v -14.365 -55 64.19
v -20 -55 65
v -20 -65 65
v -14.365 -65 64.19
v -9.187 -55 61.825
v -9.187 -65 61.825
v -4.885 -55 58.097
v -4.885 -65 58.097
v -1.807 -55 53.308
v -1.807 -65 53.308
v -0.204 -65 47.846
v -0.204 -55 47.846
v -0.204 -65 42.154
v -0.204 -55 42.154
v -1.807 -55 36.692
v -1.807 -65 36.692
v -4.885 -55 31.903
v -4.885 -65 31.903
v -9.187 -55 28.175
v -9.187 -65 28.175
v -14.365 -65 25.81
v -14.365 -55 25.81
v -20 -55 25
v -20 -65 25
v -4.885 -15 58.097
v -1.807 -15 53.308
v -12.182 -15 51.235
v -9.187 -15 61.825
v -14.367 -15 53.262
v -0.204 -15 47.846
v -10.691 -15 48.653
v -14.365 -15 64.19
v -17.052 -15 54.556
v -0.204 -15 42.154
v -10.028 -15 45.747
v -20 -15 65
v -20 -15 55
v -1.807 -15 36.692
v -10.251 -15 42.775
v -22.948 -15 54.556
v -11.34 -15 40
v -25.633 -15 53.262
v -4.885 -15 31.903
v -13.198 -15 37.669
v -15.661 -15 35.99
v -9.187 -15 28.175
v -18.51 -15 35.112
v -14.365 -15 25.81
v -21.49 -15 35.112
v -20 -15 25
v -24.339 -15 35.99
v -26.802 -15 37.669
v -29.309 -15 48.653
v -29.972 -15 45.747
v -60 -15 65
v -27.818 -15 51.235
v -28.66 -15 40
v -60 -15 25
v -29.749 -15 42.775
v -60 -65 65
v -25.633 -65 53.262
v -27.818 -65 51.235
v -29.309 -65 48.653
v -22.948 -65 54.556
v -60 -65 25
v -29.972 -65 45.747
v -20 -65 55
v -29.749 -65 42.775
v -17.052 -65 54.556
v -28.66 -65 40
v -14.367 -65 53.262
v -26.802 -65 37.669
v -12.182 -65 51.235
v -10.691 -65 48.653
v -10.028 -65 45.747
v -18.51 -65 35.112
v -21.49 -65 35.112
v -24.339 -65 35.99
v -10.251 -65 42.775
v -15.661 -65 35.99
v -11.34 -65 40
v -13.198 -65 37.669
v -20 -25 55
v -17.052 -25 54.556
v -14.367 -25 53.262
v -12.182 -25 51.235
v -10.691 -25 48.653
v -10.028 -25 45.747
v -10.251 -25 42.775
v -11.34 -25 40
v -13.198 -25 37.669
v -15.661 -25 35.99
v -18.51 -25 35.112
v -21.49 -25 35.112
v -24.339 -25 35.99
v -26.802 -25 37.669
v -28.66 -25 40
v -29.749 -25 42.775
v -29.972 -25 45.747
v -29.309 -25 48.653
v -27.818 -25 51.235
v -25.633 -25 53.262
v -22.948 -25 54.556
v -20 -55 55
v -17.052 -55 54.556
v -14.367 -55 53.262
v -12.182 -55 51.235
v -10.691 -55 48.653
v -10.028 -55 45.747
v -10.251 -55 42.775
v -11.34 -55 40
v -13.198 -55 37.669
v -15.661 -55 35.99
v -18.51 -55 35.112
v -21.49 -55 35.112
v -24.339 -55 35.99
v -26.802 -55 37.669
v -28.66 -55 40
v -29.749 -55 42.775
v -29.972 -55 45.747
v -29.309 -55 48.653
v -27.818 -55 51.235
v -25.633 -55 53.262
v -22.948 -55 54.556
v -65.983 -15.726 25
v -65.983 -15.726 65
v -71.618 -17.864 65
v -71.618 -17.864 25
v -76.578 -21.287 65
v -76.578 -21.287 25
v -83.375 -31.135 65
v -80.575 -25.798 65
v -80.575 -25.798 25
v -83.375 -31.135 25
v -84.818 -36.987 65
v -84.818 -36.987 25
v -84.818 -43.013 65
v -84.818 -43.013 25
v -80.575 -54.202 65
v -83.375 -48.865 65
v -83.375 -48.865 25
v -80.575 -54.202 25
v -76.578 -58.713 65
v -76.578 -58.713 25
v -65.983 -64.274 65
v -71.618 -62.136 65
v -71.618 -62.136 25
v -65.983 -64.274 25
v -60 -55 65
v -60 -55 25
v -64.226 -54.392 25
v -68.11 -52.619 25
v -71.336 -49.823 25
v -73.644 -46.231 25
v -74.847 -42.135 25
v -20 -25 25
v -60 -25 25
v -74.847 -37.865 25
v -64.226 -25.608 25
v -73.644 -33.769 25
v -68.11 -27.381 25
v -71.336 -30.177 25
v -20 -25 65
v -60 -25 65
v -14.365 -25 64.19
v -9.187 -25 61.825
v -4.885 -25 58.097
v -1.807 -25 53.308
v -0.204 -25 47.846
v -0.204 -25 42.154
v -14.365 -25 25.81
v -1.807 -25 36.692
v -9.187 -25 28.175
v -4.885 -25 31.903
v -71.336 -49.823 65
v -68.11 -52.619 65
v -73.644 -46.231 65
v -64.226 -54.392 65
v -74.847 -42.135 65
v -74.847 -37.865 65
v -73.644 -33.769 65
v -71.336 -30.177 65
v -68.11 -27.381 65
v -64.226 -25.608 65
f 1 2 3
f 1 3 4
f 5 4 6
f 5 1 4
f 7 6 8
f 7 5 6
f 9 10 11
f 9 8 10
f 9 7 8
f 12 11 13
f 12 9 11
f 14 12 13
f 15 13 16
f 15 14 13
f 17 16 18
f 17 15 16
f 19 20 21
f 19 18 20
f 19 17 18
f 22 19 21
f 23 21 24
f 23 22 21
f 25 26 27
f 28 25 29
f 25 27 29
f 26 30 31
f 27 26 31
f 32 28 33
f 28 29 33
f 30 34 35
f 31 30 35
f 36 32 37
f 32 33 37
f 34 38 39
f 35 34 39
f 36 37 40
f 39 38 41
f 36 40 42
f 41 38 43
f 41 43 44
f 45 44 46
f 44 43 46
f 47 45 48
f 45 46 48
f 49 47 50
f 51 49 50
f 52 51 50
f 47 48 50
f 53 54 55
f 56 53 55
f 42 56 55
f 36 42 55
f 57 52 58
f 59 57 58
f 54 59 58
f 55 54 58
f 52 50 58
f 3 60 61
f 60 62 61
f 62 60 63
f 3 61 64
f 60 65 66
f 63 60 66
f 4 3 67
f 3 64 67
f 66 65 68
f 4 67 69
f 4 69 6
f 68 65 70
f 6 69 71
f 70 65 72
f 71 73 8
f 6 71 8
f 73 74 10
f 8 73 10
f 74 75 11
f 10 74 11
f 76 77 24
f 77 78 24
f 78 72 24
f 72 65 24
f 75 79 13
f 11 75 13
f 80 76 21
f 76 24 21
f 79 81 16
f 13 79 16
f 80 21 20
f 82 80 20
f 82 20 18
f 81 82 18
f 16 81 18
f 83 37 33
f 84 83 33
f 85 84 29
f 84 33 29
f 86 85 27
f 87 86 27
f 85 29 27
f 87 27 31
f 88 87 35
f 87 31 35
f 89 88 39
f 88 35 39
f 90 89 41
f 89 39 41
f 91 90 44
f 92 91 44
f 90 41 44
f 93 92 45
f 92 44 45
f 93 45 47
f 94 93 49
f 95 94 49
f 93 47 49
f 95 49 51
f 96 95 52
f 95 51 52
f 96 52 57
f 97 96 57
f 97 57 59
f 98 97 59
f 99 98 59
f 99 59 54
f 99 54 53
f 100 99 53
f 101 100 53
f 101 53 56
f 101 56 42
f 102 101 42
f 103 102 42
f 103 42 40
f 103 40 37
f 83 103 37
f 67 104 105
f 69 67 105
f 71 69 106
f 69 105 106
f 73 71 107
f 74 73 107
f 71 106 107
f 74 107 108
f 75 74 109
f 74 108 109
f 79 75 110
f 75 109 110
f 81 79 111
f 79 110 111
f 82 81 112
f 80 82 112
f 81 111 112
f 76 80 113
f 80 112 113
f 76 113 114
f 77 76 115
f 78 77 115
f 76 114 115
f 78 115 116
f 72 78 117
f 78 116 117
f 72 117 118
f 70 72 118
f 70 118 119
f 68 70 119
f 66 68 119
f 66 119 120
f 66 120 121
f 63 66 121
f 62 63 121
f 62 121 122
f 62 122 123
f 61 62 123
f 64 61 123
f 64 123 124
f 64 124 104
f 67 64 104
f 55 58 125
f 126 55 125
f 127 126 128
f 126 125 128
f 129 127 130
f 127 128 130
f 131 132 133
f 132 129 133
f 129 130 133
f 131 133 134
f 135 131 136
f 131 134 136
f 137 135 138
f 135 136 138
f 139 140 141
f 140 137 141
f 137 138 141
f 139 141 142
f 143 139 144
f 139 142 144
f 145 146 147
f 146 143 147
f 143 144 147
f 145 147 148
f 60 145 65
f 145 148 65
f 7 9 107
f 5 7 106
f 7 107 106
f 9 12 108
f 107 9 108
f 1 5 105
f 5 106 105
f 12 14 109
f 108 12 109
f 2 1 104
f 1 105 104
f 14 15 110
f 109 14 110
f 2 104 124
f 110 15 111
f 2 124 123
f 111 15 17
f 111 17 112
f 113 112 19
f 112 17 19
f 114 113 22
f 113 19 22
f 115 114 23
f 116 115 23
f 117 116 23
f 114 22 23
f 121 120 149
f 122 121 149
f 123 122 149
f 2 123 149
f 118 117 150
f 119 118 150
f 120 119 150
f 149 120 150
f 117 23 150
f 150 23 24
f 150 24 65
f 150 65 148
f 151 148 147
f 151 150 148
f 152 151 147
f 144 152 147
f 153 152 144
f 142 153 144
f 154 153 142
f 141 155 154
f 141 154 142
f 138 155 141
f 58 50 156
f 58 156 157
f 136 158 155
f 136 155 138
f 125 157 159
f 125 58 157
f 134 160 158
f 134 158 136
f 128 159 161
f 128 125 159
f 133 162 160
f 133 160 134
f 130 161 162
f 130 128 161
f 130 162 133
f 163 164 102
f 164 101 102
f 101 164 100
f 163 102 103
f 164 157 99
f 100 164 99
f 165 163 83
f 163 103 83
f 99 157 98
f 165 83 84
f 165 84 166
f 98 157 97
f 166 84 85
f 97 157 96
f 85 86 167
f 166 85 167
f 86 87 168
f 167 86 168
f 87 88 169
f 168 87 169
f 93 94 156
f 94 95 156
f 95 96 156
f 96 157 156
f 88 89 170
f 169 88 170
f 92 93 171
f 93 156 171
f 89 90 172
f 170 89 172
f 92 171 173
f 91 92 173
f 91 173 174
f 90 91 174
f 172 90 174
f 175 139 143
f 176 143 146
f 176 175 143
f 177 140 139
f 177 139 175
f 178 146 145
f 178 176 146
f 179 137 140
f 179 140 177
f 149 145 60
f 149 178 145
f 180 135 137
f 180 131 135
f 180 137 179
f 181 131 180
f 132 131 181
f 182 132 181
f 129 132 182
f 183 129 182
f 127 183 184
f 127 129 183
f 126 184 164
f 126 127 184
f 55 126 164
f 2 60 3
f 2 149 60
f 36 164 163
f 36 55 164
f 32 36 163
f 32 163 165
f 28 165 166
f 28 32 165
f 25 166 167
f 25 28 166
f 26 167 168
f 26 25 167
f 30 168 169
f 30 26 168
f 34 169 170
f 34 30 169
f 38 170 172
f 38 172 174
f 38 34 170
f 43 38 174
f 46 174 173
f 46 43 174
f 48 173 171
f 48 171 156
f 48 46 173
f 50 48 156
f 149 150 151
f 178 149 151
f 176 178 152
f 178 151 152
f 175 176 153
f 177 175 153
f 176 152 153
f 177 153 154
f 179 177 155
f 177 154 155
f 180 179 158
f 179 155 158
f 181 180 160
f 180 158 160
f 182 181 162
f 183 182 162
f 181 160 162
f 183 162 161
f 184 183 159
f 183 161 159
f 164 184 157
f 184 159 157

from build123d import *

# Parameters (mm, degrees)
EXTRUDE_THIN1_DEPTH = 90
SKETCH2_R           = 10
BOSS_EXTRUDE1_DEPTH = 90


with BuildPart() as part:
    # Sketch1 → Extrude-Thin1 (new body)
    with BuildSketch(Plane.XY):
        with BuildLine():
            Line((0, -15), (-60, -15))
            ThreePointArc((-60, -15), (-85, -40), (-60, -65))
            Line((-60, -65), (0, -65))
            Line((0, -65), (0, -55))
            Line((0, -55), (-60, -55))
            ThreePointArc((-60, -55), (-75, -40), (-60, -25))
            Line((-60, -25), (0, -25))
            Line((0, -25), (0, -15))
        make_face()
    extrude(amount=EXTRUDE_THIN1_DEPTH)


with BuildPart() as body_2:
    # Sketch2 → Boss-Extrude1 (new body)
    with BuildSketch(Plane(origin=(0, 0, 0), x_dir=(1, 0, 0), z_dir=(0, 1, 0))):
        with BuildLine():
            Line((-85, -25), (-85, -65))
            Line((-85, -65), (-20, -65))
            ThreePointArc((-20, -65), (0, -45), (-20, -25))
            Line((-20, -25), (-85, -25))
        make_face()
        with Locations(Location((-20, -45, 0), (0, 0, 270))):
            Circle(SKETCH2_R, mode=Mode.SUBTRACT)
    extrude(amount=-BOSS_EXTRUDE1_DEPTH)


with BuildPart() as part_1:
    add(part.part)

    # Combine 1: intersect body 2
    add(body_2.part, mode=Mode.INTERSECT)


solid = part_1.part
